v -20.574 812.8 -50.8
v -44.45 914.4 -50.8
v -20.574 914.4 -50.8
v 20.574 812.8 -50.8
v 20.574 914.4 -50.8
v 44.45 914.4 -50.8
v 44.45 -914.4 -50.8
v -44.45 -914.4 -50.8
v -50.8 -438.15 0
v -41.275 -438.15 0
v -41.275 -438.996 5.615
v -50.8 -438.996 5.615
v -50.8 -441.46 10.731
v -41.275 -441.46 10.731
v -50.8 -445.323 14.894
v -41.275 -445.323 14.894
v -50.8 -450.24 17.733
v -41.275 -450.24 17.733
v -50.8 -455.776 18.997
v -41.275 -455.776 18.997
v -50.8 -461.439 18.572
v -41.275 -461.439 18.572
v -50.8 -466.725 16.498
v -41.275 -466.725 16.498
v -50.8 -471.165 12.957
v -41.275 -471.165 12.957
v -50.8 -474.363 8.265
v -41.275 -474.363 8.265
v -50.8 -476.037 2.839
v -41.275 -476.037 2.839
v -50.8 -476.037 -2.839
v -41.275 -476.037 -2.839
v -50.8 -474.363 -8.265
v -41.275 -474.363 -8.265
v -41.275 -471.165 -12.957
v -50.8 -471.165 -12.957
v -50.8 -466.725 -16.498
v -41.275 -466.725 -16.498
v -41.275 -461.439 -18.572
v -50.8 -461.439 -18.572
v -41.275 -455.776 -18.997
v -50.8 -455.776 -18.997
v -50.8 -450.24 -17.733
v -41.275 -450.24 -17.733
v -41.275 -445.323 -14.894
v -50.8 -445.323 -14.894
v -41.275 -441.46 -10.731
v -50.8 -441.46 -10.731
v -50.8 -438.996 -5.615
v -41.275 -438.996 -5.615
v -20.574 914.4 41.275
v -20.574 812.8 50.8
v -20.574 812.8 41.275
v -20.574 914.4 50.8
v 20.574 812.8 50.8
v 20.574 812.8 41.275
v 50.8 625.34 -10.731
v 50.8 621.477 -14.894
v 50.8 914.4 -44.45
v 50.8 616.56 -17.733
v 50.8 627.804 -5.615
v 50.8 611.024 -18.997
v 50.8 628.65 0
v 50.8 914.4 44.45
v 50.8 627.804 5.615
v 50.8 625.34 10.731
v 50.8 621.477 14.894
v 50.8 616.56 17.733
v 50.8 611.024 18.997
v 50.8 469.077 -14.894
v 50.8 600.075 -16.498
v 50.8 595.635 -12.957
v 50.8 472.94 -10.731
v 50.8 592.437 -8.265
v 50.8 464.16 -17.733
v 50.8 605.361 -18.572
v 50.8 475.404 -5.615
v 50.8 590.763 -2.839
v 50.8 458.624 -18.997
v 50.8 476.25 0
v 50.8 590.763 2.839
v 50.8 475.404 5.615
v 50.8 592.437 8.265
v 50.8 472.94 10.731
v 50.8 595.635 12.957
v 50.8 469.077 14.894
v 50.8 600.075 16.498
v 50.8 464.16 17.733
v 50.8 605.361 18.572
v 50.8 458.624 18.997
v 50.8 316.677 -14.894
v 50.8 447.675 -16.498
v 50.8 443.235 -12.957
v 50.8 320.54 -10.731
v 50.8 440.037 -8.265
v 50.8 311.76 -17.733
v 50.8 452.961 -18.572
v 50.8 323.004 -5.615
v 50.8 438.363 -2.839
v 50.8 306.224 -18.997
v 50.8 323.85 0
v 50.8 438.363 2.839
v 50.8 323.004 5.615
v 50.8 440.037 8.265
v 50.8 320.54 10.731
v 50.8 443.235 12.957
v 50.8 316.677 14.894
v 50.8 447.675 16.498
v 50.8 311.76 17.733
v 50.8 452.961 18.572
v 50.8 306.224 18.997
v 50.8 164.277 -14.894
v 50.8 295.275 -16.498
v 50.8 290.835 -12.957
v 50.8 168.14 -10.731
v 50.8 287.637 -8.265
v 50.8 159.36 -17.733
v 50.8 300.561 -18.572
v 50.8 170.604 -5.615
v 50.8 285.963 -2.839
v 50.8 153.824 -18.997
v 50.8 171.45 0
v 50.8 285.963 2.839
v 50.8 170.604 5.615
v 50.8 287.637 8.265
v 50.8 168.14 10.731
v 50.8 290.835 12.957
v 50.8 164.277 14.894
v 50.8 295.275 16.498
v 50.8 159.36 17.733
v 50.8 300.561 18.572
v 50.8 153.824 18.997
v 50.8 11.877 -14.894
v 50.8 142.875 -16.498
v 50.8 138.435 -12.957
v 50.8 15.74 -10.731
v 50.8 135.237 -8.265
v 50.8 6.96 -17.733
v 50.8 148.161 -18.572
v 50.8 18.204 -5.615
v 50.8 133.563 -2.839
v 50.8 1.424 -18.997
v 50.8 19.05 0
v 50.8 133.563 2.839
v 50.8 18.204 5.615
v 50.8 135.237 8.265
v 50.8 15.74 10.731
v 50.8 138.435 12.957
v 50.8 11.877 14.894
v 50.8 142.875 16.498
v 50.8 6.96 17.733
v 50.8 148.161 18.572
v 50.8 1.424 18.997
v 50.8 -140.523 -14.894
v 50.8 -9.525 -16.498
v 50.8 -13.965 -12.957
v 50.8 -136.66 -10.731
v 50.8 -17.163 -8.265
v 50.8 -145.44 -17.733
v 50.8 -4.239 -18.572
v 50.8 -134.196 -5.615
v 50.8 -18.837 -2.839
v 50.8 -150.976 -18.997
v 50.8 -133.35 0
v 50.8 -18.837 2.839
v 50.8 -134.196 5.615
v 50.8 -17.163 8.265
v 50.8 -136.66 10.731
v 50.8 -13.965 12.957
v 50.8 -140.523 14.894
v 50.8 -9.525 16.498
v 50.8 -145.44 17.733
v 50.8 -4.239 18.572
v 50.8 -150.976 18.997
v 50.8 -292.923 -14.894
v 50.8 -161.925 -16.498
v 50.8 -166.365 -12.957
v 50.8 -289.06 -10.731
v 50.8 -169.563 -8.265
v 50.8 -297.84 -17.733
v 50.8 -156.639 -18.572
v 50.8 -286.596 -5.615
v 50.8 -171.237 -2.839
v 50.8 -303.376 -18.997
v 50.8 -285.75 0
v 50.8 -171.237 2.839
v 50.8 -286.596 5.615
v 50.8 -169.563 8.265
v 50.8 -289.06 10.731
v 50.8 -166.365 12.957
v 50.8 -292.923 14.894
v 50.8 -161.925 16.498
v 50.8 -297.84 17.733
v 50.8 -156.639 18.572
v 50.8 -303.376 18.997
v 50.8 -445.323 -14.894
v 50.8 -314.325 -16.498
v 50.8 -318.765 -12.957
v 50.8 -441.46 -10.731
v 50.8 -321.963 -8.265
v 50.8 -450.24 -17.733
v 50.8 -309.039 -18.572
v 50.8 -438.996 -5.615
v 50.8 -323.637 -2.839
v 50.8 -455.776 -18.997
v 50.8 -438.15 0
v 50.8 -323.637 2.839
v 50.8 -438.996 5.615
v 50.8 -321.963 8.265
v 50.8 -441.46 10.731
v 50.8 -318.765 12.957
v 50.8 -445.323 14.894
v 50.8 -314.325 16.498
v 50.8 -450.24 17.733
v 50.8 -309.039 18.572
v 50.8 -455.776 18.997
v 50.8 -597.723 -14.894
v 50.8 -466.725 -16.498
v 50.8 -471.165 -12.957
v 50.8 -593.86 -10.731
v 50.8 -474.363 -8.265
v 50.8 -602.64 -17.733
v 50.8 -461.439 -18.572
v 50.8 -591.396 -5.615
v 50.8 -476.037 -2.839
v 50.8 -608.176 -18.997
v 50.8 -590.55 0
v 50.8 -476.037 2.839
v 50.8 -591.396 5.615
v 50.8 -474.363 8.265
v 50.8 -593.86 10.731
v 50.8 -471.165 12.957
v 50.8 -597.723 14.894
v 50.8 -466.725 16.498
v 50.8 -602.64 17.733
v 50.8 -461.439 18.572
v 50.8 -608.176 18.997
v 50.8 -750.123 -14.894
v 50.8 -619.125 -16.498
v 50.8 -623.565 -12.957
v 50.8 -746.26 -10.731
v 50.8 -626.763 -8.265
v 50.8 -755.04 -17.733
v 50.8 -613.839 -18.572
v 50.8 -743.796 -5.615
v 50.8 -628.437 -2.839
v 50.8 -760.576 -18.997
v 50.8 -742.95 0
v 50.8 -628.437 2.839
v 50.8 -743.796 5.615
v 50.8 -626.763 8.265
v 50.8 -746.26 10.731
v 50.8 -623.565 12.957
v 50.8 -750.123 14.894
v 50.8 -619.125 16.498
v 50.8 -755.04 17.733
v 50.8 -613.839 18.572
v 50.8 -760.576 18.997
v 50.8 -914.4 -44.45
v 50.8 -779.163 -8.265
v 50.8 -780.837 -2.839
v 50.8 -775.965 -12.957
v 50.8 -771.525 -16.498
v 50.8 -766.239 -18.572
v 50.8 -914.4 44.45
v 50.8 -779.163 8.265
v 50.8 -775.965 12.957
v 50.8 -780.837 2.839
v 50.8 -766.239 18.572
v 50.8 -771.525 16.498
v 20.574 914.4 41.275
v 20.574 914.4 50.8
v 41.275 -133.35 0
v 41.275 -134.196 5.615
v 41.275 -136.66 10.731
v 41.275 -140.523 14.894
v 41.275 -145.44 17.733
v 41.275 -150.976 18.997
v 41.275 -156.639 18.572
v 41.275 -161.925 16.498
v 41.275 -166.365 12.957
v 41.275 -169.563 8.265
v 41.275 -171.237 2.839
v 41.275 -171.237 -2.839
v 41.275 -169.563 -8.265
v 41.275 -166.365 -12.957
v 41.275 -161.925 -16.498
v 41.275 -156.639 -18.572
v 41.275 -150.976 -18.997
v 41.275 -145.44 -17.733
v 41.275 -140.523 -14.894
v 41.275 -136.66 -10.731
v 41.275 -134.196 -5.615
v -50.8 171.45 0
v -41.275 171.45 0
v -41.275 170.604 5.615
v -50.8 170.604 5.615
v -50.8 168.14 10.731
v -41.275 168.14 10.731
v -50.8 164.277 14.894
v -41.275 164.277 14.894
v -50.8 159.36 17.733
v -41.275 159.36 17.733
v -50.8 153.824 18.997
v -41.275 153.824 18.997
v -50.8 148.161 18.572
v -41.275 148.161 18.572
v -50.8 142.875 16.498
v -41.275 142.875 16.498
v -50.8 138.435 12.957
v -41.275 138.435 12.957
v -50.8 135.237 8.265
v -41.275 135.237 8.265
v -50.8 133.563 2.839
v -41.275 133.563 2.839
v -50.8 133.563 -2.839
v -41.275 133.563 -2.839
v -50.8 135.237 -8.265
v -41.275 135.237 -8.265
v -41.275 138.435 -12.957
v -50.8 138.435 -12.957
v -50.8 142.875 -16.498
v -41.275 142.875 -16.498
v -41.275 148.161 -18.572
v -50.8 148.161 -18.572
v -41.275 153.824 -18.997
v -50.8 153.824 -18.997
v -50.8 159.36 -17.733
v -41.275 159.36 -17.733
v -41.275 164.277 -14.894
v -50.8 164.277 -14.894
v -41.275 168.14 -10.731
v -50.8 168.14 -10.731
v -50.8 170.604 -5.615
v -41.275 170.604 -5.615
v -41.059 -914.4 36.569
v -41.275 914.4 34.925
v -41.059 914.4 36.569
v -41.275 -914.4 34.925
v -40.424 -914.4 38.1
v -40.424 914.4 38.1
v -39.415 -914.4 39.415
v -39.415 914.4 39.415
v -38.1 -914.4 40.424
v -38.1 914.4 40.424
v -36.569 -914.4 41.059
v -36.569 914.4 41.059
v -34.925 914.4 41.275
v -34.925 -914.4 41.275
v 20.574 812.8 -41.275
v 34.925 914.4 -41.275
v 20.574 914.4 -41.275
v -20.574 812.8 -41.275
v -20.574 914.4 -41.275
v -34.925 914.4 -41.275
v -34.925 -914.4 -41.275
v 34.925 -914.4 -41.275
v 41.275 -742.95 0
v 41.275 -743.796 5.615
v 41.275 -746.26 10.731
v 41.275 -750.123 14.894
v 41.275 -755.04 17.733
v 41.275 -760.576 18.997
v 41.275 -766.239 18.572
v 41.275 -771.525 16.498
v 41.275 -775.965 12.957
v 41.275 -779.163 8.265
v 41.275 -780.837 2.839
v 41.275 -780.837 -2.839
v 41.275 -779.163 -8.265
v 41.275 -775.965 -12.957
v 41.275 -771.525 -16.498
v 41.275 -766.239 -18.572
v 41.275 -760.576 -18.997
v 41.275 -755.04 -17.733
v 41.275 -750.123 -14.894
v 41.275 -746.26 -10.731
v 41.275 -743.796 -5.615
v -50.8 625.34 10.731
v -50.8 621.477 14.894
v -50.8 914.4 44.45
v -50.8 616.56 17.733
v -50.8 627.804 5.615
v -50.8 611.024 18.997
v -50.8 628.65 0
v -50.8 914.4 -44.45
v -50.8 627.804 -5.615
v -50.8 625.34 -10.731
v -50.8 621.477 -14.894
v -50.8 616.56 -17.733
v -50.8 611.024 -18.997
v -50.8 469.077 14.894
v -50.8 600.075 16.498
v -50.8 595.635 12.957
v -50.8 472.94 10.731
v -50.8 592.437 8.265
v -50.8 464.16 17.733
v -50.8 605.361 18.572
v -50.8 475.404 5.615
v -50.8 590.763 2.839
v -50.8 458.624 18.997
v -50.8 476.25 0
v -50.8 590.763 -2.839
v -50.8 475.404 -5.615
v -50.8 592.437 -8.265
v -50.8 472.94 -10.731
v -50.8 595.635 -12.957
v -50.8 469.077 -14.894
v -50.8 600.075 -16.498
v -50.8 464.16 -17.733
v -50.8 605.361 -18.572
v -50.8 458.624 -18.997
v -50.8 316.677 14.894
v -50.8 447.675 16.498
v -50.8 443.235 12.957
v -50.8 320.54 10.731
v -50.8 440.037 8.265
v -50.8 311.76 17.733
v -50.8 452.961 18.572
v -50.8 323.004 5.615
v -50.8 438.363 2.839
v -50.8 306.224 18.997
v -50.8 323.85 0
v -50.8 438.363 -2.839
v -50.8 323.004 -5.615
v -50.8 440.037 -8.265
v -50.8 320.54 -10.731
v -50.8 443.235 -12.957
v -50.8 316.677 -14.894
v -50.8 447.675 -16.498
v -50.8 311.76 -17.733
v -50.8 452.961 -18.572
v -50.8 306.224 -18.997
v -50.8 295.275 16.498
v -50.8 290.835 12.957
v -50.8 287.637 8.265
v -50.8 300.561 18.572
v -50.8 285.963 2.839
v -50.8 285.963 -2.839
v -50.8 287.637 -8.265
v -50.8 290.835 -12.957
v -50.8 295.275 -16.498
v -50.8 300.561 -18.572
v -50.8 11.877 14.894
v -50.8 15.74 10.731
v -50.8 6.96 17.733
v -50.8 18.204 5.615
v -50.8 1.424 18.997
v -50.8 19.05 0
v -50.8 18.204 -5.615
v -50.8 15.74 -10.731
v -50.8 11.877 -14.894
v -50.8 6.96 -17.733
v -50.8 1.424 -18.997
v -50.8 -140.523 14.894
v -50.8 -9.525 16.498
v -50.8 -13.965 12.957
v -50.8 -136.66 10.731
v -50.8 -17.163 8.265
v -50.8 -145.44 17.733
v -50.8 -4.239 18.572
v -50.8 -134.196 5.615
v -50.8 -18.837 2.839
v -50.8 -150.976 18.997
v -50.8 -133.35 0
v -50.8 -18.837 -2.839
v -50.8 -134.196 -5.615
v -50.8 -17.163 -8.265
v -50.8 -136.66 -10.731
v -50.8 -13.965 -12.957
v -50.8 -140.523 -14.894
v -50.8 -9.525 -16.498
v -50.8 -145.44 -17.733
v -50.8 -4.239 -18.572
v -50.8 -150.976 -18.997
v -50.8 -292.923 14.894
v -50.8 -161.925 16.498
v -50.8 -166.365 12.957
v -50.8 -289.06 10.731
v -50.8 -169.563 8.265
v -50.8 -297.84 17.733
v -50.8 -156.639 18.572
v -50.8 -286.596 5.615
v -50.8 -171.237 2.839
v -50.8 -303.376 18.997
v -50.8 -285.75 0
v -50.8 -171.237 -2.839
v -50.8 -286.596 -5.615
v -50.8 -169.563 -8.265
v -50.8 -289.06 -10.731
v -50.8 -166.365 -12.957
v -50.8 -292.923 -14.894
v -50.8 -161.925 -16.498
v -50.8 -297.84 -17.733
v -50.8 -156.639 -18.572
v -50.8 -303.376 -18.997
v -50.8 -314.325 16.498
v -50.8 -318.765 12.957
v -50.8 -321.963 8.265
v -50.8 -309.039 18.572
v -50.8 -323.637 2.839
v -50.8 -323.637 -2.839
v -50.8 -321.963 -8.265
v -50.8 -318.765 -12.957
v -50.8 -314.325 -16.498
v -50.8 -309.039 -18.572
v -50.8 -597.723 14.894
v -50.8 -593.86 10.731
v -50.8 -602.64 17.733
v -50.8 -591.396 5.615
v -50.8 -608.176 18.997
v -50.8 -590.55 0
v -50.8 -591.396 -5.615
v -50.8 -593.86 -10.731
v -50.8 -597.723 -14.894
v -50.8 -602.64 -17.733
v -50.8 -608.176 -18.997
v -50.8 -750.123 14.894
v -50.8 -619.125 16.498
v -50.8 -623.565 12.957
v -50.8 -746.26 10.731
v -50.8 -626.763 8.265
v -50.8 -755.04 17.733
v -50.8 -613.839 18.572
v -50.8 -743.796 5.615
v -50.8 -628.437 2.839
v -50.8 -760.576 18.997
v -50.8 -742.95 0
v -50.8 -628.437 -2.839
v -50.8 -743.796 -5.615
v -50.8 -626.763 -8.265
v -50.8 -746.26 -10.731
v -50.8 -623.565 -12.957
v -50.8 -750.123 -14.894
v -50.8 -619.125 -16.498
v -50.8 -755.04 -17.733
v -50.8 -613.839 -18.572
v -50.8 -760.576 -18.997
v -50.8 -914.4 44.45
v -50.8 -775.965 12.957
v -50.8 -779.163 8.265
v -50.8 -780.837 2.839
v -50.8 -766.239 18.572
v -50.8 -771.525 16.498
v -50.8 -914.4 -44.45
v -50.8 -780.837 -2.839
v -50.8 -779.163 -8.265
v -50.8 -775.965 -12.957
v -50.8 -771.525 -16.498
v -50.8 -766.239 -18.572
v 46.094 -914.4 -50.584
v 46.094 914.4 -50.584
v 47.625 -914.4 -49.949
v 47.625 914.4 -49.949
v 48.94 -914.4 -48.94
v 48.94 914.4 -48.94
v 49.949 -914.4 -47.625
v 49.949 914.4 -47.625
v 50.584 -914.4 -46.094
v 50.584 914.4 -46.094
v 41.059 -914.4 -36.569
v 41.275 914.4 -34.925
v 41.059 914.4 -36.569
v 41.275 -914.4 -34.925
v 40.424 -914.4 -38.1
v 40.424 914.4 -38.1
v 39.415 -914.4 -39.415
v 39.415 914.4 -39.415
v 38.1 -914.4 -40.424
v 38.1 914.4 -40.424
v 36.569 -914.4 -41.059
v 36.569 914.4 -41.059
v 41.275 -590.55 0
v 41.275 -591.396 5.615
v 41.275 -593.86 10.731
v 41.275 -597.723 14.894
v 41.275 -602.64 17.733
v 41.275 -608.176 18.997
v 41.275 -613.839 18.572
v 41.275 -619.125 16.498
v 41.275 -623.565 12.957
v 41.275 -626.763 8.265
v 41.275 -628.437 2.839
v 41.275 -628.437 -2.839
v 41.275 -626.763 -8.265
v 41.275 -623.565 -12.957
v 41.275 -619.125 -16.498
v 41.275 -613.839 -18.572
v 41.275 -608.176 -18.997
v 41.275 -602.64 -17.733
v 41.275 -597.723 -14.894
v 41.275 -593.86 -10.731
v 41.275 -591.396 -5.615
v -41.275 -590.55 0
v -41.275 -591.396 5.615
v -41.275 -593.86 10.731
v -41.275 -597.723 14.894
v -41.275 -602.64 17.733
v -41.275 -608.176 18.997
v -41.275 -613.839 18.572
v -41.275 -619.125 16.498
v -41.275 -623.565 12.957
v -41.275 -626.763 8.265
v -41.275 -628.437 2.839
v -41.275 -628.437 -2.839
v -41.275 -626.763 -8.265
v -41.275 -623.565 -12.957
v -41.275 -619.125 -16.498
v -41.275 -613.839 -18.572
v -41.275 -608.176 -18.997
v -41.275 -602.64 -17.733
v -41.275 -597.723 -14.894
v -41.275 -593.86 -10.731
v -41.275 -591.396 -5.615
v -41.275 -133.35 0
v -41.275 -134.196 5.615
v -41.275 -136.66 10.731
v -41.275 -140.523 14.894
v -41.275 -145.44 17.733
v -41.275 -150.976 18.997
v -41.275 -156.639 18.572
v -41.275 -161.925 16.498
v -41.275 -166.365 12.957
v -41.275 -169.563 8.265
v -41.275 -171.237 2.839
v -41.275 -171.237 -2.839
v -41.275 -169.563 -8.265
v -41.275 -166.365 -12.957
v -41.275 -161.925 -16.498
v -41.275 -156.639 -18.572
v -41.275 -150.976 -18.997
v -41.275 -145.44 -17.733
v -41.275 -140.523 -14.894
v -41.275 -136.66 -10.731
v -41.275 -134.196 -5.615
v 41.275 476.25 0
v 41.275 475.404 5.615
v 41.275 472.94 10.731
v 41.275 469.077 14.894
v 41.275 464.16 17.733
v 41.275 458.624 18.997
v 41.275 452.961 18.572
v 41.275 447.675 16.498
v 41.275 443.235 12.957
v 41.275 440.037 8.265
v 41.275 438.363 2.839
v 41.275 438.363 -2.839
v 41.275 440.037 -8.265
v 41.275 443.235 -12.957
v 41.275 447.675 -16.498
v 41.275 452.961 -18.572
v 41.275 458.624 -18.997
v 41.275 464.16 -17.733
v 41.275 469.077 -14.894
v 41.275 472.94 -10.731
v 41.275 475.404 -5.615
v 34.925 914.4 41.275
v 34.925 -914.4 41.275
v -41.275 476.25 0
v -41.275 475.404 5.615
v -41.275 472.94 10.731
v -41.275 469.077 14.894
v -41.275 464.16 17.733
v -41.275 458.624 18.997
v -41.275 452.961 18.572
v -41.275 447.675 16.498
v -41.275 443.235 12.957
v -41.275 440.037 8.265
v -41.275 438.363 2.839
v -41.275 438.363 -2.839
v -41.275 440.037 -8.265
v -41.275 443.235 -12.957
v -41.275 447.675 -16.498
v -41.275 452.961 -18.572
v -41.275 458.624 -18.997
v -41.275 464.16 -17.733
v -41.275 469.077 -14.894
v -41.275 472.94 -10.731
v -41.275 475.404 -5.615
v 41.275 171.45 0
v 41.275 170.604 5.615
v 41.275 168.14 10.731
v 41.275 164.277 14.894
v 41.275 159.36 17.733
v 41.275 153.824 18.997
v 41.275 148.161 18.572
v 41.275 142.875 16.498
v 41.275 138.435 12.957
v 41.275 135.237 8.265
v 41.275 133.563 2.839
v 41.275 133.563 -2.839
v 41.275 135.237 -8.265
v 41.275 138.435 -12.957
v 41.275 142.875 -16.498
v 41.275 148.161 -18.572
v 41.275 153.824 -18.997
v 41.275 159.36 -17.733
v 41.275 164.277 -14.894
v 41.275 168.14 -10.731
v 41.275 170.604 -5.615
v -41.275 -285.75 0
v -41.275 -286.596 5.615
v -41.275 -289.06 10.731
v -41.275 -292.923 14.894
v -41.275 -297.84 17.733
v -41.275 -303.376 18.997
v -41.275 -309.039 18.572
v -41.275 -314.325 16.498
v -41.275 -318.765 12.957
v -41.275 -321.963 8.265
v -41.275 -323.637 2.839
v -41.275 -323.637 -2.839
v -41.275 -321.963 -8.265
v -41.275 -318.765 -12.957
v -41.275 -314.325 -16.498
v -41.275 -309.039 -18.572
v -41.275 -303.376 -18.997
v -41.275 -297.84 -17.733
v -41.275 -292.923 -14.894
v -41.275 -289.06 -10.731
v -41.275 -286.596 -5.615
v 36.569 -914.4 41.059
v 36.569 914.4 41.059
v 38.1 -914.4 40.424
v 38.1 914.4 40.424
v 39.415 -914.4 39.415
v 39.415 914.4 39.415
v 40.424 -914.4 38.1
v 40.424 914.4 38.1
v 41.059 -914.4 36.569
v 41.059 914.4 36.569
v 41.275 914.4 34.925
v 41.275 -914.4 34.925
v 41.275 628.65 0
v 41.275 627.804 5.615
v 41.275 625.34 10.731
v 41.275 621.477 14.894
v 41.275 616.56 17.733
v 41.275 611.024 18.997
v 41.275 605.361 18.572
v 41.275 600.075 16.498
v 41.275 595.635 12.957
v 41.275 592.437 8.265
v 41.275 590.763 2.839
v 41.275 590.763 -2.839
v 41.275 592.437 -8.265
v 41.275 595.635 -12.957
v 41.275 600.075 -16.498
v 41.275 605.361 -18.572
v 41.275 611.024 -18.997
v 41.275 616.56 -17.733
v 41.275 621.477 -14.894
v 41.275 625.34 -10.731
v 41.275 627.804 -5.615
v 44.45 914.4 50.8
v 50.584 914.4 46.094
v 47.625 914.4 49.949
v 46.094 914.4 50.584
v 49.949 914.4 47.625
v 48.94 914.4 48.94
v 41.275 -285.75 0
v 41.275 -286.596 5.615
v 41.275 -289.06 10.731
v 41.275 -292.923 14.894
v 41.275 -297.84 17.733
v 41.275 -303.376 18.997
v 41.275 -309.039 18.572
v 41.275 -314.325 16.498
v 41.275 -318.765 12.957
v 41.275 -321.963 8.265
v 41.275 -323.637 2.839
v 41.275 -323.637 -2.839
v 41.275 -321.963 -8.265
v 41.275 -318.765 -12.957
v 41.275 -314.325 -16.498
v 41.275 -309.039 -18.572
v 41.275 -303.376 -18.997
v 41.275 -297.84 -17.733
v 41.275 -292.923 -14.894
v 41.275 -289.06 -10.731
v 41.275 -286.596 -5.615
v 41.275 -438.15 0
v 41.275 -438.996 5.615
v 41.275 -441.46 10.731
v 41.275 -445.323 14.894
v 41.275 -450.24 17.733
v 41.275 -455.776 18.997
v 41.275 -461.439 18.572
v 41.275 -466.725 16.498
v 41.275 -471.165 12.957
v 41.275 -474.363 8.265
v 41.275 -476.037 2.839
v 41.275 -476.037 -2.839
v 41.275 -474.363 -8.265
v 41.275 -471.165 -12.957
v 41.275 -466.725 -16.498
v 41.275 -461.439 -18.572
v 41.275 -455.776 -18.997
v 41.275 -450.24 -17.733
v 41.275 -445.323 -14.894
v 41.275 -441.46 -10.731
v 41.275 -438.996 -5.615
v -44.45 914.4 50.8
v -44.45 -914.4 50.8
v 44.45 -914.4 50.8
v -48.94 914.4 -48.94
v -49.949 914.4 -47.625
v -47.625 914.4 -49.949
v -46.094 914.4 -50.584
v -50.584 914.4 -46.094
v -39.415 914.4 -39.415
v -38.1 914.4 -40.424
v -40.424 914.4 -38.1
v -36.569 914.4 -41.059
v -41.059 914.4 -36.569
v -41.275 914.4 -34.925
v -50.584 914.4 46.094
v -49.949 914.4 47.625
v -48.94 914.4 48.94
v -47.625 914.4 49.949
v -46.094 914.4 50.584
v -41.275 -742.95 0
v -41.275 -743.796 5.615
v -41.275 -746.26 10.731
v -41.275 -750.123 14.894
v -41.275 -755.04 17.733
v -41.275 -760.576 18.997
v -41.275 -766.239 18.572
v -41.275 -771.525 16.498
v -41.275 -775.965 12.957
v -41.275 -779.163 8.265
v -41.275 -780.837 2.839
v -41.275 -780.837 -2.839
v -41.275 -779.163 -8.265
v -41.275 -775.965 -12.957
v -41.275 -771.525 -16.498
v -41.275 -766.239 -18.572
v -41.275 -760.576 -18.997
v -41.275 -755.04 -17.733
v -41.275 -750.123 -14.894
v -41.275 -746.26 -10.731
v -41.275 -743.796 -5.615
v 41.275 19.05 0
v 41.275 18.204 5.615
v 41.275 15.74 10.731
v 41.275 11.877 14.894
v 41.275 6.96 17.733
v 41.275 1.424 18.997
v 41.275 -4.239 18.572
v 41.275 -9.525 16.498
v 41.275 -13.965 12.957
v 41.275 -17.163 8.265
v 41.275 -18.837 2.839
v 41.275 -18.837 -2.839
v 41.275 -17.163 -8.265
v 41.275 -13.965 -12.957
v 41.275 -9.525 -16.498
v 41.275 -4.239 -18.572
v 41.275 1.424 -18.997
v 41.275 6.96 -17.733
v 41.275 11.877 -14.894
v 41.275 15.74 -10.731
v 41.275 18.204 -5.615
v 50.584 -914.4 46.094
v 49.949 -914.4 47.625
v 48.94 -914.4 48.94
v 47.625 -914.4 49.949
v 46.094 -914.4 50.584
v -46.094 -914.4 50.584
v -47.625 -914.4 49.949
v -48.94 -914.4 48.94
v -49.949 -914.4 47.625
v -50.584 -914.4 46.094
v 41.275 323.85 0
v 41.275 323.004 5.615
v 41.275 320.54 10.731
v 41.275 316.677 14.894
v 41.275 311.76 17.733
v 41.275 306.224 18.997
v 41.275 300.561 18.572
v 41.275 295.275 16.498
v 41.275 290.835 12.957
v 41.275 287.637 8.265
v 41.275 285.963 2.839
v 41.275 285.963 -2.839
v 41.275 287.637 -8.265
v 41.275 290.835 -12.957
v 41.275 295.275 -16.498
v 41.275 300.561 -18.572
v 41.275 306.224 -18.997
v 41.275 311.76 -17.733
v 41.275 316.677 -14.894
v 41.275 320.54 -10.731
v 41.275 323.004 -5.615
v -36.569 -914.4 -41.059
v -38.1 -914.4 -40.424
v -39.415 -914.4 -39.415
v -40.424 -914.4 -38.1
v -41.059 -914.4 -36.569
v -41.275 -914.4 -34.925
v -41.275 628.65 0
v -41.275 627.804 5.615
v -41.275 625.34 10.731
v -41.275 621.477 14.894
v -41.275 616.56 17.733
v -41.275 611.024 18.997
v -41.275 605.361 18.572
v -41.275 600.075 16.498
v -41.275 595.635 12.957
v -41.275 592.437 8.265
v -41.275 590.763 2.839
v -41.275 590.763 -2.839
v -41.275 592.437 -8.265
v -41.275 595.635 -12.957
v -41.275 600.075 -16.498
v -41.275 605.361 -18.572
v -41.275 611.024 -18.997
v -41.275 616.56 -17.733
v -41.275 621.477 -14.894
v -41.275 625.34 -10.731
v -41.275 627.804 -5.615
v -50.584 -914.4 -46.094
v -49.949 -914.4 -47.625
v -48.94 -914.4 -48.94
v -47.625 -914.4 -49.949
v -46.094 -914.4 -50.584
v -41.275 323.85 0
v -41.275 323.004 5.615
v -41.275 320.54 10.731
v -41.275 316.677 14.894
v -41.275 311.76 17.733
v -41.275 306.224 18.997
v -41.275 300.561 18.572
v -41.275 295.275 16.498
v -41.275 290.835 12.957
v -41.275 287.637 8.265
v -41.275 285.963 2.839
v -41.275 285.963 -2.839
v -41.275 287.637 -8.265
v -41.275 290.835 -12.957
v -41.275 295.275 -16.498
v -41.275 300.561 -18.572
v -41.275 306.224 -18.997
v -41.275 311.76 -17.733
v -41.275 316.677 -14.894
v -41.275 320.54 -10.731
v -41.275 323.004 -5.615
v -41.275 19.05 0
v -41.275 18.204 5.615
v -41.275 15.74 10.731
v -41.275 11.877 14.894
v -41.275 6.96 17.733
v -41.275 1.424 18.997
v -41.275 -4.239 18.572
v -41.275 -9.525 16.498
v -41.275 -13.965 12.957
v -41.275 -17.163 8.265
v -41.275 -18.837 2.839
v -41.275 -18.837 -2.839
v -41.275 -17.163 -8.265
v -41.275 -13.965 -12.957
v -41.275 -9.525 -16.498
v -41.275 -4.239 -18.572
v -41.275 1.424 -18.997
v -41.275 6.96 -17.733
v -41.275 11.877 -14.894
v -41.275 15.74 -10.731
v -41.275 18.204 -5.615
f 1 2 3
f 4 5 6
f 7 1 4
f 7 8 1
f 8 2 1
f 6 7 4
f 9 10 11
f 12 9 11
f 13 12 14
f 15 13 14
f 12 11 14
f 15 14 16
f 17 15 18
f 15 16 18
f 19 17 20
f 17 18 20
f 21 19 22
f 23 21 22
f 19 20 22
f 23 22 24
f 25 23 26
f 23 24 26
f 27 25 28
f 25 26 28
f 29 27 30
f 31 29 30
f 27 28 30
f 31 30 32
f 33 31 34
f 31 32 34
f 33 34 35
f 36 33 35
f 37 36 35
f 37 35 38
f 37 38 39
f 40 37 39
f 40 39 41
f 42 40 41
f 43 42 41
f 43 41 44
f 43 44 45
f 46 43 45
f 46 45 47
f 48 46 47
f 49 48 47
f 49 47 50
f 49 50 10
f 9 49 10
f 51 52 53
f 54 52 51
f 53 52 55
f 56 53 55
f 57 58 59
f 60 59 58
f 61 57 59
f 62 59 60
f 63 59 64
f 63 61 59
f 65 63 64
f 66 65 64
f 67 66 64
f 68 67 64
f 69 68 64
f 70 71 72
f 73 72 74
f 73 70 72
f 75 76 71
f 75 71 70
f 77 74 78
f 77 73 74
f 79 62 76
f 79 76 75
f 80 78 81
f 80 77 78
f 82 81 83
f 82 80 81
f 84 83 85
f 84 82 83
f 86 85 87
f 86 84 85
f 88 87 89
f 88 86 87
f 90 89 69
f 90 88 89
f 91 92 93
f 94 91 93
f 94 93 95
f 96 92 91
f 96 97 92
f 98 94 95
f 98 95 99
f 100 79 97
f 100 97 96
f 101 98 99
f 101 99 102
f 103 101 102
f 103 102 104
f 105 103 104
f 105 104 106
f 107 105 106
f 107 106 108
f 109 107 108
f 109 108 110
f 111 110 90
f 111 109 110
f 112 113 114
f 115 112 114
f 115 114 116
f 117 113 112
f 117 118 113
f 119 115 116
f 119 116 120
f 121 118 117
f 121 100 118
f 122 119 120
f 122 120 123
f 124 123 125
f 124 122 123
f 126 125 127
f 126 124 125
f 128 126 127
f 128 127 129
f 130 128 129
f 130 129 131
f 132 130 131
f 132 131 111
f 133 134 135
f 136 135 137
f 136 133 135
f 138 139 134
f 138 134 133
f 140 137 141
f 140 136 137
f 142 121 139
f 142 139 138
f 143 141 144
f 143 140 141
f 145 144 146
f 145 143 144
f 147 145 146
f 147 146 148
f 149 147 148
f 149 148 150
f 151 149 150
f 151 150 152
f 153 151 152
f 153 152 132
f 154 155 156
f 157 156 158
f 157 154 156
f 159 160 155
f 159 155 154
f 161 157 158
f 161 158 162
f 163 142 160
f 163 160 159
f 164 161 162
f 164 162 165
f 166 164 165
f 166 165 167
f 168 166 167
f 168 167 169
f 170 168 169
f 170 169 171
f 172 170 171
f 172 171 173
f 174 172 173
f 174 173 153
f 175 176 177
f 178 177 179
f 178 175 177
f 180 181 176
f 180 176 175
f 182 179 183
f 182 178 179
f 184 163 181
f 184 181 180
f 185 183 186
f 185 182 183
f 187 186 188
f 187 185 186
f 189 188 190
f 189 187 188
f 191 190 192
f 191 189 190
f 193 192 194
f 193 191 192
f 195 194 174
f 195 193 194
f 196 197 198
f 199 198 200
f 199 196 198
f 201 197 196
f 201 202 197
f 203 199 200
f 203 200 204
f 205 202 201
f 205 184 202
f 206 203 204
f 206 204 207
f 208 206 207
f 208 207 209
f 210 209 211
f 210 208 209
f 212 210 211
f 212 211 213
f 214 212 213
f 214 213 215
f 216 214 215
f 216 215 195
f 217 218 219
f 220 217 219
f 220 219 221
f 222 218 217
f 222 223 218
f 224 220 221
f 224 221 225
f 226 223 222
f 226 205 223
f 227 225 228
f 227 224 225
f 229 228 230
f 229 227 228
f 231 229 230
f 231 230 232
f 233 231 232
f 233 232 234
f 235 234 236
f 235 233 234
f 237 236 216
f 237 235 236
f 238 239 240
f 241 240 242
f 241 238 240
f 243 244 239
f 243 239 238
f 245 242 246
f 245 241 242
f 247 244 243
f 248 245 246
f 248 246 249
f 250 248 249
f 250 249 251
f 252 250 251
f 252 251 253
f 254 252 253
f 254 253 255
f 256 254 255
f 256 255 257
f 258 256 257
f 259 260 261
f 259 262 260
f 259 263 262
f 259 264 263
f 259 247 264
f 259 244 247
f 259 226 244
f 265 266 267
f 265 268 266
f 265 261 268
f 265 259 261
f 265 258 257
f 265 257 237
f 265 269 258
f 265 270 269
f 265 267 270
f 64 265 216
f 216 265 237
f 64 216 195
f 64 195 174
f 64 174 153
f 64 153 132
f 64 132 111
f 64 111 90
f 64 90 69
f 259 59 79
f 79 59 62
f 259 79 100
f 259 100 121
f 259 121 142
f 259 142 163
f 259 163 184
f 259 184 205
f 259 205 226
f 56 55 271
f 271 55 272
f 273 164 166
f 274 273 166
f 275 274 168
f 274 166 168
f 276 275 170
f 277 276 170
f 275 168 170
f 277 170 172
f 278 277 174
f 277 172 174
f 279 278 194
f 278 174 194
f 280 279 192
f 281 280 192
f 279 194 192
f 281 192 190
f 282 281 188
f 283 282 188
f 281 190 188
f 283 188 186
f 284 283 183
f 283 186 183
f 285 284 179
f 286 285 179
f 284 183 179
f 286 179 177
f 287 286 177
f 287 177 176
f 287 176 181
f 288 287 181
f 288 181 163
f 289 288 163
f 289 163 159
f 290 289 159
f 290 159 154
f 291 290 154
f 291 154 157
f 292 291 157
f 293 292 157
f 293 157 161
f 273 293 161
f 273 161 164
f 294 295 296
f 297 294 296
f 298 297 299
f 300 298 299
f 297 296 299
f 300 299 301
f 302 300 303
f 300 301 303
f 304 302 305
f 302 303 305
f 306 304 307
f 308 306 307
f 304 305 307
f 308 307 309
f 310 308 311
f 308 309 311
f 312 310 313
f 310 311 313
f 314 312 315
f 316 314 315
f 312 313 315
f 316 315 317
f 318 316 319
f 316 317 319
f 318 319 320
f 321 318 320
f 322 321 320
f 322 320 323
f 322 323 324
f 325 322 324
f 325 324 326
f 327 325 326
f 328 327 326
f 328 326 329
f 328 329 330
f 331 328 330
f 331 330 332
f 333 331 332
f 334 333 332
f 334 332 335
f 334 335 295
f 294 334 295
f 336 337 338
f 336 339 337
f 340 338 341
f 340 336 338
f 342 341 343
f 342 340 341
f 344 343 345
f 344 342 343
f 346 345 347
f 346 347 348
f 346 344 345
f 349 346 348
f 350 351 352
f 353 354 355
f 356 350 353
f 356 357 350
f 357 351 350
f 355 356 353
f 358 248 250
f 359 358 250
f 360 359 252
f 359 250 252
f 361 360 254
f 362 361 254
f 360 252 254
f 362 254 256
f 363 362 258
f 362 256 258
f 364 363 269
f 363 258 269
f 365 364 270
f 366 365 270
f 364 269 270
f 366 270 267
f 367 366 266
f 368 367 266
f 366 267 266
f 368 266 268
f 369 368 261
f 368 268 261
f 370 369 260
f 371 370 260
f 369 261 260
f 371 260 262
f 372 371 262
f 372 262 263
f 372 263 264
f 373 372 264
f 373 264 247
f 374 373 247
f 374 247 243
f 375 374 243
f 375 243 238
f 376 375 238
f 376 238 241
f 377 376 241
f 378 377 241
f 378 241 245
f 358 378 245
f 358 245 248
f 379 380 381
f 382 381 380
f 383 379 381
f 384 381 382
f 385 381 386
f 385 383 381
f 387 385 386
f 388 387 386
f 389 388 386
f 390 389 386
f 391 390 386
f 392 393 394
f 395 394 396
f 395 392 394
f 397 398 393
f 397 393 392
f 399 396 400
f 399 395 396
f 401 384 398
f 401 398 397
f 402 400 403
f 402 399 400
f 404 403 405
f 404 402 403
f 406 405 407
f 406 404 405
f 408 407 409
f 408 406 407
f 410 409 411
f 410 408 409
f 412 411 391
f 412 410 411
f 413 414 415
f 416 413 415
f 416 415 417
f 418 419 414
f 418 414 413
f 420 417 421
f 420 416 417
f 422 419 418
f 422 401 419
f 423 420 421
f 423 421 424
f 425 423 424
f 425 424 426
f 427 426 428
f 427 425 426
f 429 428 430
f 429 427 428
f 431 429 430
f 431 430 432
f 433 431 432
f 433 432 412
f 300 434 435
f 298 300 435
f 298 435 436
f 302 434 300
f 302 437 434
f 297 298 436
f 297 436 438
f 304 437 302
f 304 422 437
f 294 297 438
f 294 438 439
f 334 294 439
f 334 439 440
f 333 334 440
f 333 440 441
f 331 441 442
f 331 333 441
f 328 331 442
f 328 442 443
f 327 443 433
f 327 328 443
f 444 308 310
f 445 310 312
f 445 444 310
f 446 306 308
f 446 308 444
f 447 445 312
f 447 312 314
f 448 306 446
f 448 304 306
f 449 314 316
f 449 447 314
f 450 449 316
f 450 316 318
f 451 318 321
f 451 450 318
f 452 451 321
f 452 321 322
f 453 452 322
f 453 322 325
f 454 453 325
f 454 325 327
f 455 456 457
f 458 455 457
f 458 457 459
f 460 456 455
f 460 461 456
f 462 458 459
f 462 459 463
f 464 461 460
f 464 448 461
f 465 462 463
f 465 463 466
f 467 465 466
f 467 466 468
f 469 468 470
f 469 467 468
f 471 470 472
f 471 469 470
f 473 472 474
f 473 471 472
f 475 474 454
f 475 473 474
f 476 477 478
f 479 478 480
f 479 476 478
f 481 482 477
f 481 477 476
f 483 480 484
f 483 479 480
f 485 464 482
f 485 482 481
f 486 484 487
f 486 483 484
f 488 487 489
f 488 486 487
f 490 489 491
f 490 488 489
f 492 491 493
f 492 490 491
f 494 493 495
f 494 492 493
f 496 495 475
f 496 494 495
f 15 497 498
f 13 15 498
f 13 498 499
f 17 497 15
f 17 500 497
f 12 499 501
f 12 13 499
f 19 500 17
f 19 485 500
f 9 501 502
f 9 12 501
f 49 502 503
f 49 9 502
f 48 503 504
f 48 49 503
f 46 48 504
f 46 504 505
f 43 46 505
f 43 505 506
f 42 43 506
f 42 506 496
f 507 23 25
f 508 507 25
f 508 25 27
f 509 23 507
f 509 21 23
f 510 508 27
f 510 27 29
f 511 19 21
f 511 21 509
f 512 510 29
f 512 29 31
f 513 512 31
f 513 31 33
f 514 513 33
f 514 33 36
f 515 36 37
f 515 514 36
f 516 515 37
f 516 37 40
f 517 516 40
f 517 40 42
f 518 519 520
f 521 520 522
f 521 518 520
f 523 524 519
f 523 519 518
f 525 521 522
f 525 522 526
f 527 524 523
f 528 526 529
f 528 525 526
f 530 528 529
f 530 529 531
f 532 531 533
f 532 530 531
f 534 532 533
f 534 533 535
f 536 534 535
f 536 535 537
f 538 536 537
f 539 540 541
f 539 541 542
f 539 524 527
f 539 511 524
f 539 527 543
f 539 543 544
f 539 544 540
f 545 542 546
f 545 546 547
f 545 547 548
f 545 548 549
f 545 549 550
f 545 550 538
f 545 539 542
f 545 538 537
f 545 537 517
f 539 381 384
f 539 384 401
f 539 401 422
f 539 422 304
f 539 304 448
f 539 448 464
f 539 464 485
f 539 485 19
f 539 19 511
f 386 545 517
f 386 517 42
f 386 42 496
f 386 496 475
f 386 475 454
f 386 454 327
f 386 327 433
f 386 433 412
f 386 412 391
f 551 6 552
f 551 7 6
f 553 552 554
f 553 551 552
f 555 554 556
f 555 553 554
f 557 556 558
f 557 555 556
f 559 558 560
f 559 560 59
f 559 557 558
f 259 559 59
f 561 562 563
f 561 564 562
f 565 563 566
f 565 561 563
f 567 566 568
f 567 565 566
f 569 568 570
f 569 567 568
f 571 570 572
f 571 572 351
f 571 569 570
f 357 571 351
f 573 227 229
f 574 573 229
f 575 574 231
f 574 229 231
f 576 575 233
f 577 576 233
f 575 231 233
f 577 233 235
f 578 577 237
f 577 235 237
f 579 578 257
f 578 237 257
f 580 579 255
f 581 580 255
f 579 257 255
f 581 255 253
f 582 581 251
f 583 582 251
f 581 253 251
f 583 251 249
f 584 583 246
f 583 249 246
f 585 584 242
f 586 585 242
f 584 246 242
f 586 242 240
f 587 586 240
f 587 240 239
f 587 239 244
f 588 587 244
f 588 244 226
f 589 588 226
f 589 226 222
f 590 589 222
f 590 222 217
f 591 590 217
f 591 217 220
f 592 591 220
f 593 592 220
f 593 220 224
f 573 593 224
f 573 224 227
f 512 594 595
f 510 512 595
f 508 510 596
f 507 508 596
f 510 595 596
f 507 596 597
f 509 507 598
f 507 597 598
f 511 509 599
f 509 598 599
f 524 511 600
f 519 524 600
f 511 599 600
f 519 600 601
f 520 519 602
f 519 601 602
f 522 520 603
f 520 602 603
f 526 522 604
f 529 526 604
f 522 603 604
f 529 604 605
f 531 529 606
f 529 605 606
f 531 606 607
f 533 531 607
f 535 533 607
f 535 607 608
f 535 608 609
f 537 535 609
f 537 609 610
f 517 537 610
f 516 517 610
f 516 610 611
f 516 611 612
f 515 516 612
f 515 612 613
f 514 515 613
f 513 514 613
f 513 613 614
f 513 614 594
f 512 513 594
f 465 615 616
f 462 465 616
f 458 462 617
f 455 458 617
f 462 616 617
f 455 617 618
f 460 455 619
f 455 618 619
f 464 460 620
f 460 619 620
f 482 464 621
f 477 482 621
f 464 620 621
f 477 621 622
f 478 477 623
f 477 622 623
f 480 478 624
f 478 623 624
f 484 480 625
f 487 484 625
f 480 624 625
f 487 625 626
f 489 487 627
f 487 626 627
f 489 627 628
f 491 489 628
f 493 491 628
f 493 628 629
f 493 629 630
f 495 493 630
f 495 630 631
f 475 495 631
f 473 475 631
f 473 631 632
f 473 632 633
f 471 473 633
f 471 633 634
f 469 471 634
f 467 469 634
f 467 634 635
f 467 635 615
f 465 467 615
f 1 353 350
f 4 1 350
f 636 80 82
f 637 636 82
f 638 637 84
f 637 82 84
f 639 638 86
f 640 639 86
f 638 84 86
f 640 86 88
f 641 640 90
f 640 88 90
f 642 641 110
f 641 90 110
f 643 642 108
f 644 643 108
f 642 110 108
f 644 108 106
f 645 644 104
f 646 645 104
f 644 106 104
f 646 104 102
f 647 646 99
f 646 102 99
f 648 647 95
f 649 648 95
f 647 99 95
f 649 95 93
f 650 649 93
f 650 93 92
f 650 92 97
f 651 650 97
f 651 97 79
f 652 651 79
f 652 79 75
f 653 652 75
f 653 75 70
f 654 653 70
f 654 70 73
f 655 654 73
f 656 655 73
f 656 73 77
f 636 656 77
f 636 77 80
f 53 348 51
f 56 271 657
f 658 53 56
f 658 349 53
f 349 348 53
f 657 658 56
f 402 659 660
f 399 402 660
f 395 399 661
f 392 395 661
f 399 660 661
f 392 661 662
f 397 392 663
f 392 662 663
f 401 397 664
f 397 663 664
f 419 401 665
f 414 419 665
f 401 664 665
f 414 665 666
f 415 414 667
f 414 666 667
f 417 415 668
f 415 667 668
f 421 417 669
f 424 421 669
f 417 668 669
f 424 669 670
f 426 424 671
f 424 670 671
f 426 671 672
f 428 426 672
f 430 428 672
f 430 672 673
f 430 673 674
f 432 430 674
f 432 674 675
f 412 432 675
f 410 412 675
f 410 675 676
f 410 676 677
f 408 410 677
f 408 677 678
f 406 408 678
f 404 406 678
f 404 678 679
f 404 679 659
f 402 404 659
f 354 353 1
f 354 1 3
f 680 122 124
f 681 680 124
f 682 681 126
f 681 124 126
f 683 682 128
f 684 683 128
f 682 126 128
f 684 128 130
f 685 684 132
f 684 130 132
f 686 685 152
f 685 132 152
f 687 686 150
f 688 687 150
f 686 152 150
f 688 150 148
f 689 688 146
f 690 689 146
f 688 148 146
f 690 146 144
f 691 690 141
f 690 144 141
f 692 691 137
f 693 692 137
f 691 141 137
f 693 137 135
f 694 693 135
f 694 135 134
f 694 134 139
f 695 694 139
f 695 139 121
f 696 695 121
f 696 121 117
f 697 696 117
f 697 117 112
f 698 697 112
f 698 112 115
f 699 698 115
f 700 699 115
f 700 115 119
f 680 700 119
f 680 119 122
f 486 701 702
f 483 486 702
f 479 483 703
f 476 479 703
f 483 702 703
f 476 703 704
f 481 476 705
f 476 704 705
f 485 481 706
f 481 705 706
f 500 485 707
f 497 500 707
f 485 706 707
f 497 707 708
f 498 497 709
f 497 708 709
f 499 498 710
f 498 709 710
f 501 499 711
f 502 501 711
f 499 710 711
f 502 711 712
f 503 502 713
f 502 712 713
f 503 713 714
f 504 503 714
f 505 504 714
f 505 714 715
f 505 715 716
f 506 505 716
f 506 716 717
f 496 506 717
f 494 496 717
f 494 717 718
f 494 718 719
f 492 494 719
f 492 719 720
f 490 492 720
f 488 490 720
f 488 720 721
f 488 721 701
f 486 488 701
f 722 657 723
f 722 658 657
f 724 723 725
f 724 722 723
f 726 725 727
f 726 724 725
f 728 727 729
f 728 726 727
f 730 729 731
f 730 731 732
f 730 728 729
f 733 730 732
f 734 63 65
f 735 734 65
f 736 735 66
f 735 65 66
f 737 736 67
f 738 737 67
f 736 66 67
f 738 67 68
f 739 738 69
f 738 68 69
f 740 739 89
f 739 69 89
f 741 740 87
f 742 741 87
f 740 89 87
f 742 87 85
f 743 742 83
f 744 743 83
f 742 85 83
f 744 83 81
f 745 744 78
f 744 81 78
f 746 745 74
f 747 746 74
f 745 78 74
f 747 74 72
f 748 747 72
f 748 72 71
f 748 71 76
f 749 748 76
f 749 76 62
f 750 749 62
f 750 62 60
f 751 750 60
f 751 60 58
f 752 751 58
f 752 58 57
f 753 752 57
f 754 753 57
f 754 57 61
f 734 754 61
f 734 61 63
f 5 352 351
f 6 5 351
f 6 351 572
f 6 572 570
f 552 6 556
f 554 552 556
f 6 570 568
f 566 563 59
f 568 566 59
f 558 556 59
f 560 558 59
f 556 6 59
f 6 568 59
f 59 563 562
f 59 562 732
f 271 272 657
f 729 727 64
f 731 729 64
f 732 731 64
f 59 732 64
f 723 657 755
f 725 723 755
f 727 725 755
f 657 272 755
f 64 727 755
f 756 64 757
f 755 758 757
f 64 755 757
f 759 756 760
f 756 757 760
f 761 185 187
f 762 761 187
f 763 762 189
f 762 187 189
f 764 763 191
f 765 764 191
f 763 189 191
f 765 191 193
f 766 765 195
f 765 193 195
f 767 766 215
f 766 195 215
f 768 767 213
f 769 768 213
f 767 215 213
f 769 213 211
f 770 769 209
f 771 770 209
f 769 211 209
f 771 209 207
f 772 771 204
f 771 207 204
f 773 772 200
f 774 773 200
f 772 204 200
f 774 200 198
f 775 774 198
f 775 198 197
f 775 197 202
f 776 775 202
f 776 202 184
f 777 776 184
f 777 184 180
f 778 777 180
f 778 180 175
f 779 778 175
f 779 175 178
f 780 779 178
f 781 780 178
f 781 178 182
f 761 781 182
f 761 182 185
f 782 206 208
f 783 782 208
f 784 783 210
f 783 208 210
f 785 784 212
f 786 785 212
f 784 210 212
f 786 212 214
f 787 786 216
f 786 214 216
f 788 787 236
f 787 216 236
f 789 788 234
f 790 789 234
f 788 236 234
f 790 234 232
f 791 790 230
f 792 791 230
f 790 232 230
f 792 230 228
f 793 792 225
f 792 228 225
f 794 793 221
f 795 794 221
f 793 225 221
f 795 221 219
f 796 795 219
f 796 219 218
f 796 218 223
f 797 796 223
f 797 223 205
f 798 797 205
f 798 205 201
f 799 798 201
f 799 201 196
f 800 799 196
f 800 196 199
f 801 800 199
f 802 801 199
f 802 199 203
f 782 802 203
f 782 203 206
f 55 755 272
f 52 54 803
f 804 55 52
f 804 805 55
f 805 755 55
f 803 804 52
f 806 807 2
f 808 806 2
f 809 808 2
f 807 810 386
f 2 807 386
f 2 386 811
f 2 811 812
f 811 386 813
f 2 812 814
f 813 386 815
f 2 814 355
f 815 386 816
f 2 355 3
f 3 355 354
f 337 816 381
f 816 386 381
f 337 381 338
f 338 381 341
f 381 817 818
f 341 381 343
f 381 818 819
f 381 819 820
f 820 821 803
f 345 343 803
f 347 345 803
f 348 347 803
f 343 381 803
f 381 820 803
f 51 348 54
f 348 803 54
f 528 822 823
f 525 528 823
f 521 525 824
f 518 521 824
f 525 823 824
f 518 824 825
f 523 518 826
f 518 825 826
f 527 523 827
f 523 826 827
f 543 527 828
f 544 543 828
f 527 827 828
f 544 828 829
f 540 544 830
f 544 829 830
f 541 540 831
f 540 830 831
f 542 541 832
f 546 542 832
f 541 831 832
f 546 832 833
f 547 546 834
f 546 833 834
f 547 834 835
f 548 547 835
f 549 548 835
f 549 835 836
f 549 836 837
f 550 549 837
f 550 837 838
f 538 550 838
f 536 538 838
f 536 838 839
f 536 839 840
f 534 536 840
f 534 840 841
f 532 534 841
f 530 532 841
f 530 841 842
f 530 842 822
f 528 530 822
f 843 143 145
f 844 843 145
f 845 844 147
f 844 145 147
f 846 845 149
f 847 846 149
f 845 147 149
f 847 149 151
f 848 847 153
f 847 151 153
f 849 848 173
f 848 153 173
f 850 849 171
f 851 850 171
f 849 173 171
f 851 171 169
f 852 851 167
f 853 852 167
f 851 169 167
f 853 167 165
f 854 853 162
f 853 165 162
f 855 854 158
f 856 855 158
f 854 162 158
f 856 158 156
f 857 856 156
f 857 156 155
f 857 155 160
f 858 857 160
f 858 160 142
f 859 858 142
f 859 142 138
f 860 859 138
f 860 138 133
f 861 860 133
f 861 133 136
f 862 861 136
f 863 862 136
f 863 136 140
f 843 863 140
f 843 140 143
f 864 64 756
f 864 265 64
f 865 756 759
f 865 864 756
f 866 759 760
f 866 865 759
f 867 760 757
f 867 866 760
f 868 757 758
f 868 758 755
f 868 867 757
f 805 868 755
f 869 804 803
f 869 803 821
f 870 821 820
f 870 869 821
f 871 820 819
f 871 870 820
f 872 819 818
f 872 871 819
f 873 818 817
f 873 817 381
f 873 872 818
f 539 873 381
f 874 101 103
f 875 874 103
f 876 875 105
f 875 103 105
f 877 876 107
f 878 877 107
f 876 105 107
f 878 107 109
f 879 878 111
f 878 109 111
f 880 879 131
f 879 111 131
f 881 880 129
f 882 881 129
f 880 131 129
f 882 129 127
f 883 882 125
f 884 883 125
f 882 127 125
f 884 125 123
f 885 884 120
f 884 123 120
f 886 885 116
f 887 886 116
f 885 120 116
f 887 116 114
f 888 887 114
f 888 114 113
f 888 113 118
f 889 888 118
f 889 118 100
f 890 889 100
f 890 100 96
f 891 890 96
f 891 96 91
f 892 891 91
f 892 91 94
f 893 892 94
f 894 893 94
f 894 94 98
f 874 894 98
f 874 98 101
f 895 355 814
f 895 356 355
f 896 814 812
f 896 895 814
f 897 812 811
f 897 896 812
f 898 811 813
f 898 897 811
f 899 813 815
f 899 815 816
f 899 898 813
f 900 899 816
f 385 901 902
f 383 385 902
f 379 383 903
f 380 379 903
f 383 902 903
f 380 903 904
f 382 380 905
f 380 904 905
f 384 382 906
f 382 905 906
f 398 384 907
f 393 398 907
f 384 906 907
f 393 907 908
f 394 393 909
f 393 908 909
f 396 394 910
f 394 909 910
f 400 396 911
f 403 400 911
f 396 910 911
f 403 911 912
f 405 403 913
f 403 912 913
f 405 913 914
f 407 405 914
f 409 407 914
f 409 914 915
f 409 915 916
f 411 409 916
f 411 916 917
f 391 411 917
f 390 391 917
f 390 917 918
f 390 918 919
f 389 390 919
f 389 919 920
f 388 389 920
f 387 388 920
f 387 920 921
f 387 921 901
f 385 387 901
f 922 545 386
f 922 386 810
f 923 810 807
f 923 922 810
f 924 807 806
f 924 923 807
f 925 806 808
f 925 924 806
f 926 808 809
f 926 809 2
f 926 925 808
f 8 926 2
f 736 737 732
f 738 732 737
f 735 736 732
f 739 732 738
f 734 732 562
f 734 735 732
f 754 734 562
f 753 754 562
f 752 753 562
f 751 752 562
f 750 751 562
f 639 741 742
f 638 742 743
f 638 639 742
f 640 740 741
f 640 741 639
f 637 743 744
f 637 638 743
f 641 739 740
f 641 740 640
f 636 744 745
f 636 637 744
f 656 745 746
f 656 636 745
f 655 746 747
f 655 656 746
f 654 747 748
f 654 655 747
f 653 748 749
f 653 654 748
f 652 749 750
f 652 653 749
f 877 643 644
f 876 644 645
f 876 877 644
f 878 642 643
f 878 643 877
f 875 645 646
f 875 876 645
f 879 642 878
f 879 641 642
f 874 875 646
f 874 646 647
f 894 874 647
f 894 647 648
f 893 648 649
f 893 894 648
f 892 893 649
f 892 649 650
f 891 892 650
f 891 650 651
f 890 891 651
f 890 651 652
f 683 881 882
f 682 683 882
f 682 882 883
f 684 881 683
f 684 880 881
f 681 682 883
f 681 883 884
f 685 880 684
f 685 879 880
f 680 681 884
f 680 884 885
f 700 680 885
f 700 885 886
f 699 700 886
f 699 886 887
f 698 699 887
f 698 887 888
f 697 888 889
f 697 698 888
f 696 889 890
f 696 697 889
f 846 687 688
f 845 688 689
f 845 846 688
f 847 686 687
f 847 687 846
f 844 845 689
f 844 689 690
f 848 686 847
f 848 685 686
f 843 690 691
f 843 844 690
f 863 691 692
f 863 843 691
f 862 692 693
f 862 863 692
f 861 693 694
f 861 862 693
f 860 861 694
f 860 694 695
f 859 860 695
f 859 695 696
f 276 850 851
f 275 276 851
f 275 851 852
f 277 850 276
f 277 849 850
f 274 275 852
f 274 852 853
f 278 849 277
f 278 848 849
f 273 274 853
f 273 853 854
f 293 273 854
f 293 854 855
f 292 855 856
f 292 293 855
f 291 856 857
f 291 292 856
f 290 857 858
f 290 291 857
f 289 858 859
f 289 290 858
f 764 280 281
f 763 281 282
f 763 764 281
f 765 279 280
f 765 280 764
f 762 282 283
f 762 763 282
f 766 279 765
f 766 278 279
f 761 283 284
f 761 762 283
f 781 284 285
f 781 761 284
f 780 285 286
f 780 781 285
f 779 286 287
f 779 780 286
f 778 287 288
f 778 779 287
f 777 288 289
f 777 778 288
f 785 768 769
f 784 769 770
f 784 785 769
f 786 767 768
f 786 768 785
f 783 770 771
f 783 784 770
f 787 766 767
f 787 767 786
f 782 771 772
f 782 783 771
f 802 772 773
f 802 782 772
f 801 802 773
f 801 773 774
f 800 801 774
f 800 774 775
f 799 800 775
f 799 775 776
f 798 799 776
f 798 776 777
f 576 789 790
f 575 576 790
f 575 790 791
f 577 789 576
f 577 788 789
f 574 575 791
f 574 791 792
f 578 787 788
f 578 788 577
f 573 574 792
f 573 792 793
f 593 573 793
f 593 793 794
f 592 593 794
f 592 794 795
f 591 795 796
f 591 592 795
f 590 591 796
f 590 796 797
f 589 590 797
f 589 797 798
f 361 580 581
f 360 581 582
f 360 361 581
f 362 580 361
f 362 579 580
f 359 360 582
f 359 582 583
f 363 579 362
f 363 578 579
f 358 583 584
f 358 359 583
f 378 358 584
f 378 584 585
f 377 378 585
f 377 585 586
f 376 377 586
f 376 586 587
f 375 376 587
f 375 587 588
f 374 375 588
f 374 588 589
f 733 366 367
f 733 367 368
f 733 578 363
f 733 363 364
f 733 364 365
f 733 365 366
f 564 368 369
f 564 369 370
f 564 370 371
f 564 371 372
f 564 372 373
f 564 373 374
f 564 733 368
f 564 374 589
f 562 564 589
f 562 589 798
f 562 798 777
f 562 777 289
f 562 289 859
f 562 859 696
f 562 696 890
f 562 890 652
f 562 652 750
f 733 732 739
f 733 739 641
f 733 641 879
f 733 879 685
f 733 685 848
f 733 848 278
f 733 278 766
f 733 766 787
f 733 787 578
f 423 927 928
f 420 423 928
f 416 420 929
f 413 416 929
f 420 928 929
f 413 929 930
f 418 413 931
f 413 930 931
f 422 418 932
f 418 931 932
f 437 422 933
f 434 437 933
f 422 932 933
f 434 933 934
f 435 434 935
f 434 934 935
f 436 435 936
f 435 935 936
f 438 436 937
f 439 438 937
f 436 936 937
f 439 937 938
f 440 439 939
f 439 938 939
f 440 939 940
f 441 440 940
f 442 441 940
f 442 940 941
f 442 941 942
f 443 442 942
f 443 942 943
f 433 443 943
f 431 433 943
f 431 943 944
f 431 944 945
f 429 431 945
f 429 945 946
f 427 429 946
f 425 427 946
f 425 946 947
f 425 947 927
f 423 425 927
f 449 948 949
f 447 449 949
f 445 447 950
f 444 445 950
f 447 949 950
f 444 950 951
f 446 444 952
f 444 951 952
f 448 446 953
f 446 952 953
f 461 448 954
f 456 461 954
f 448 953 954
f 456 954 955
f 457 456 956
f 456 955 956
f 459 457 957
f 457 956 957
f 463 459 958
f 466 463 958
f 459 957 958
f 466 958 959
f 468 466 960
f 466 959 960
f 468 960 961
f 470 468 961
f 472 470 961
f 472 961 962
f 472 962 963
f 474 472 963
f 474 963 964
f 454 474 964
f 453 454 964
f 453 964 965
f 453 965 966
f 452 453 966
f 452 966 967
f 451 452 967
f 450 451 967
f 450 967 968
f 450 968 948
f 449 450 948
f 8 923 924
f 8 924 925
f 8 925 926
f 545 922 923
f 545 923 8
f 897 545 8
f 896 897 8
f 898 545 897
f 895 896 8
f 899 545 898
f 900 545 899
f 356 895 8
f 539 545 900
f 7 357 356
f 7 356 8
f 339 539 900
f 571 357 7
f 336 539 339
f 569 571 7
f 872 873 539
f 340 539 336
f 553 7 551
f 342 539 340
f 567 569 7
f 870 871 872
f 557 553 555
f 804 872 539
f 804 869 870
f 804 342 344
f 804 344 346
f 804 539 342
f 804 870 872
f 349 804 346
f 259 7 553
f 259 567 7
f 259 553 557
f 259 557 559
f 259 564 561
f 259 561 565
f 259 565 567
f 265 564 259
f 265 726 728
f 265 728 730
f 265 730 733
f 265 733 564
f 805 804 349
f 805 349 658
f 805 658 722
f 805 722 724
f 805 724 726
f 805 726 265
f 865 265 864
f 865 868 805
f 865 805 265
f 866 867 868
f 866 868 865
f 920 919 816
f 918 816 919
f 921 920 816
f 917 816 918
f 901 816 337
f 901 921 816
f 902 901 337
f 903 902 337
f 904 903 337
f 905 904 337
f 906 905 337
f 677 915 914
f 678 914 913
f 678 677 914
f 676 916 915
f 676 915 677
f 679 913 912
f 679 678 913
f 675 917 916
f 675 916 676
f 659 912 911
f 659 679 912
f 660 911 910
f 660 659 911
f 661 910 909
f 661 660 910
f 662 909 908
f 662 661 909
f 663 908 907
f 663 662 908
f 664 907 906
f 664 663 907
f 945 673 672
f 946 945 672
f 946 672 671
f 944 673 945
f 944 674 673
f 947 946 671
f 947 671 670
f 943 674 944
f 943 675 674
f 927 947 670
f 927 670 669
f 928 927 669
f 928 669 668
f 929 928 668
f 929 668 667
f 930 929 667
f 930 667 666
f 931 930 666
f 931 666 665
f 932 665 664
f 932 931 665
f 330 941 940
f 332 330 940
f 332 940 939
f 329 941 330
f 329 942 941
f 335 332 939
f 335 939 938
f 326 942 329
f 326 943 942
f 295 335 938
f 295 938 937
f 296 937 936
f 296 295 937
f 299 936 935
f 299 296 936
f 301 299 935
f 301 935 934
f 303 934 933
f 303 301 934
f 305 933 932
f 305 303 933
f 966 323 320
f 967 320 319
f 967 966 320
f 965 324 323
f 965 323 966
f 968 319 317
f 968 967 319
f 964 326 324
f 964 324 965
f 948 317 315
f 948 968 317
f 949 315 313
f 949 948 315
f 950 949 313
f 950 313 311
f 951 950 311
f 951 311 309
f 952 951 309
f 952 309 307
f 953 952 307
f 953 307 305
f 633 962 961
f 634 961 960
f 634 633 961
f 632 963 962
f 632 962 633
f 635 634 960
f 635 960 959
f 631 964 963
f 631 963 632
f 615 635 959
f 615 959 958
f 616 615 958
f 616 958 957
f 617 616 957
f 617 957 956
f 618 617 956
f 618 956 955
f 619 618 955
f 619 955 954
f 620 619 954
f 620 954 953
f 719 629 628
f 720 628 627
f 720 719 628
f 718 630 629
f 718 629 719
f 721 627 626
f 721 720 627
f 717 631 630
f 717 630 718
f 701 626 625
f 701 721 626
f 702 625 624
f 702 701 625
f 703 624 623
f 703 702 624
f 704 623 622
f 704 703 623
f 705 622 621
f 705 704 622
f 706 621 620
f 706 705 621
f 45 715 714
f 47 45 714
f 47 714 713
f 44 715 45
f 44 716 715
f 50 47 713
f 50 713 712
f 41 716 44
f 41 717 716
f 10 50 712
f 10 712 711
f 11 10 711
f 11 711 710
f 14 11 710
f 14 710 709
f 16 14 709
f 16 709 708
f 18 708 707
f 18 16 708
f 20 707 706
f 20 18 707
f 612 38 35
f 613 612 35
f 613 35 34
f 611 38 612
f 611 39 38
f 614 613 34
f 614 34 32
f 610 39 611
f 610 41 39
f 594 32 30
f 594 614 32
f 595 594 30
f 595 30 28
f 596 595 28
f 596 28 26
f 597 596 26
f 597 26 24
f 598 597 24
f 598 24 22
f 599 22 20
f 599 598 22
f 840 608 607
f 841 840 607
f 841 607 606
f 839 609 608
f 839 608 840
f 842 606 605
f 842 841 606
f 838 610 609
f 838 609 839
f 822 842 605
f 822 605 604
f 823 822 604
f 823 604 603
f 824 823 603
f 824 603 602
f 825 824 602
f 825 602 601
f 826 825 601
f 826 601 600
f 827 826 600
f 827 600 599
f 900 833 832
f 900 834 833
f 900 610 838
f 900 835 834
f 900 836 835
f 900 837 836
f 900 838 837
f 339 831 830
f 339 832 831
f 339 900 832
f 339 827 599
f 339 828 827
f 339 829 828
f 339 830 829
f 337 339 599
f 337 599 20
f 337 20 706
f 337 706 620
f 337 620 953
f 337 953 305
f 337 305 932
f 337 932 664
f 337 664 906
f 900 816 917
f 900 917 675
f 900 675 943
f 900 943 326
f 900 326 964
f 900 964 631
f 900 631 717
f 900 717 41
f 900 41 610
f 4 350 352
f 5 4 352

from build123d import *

# Parameters (mm, degrees)
F1_DEPTH = 914.4
F2_R     = 19.05
F3_DEPTH = 127
F4_W     = 41.148
F4_H     = 203.2
F5_DEPTH = 127


with BuildPart() as f1:
    # F0 (on Front) → F1 (new body, symmetric)
    with BuildSketch(Plane.XZ):
        with BuildLine():
            ThreePointArc((50.8, 44.45), (48.940128, 48.940128), (44.45, 50.8))
            Line((44.45, 50.8), (-44.45, 50.8))
            ThreePointArc((-44.45, 50.8), (-48.940128, 48.940128), (-50.8, 44.45))
            Line((-50.8, 44.45), (-50.8, -44.45))
            ThreePointArc((-50.8, -44.45), (-48.940128, -48.940128), (-44.45, -50.8))
            Line((-44.45, -50.8), (44.45, -50.8))
            ThreePointArc((44.45, -50.8), (48.940128, -48.940128), (50.8, -44.45))
            Line((50.8, -44.45), (50.8, 44.45))
        make_face()
        with BuildLine():
            Line((-34.925, 41.275), (34.925, 41.275))
            ThreePointArc((34.925, 41.275), (39.415128, 39.415128), (41.275, 34.925))
            Line((41.275, 34.925), (41.275, -34.925))
            ThreePointArc((41.275, -34.925), (39.415128, -39.415128), (34.925, -41.275))
            Line((34.925, -41.275), (-34.925, -41.275))
            ThreePointArc((-34.925, -41.275), (-39.415128, -39.415128), (-41.275, -34.925))
            Line((-41.275, -34.925), (-41.275, 34.925))
            ThreePointArc((-41.275, 34.925), (-39.415128, 39.415128), (-34.925, 41.275))
        make_face(mode=Mode.SUBTRACT)
    extrude(amount=F1_DEPTH, both=True)

    # F2 (on face) → F3 (cut)
    with BuildSketch(Plane.YZ.offset(50.8)):
        with Locations((304.8, 0)):
            Circle(F2_R)
        with Locations((-762, 0)):
            Circle(F2_R)
        with Locations((-609.6, 0)):
            Circle(F2_R)
        with Locations((-457.2, 0)):
            Circle(F2_R)
        with Locations((-304.8, 0)):
            Circle(F2_R)
        with Locations((-152.4, 0)):
            Circle(F2_R)
        Circle(F2_R)
        with Locations((152.4, 0)):
            Circle(F2_R)
        with Locations((457.2, 0)):
            Circle(F2_R)
        with Locations((609.6, 0)):
            Circle(F2_R)
    extrude(amount=-F3_DEPTH, mode=Mode.SUBTRACT)

    # F4 (on face) → F5 (cut)
    with BuildSketch(Plane.XY.offset(50.8)):
        with Locations((0, 914.4)):
            Rectangle(F4_W, F4_H)
    extrude(amount=-F5_DEPTH, mode=Mode.SUBTRACT)


solid = f1.part
